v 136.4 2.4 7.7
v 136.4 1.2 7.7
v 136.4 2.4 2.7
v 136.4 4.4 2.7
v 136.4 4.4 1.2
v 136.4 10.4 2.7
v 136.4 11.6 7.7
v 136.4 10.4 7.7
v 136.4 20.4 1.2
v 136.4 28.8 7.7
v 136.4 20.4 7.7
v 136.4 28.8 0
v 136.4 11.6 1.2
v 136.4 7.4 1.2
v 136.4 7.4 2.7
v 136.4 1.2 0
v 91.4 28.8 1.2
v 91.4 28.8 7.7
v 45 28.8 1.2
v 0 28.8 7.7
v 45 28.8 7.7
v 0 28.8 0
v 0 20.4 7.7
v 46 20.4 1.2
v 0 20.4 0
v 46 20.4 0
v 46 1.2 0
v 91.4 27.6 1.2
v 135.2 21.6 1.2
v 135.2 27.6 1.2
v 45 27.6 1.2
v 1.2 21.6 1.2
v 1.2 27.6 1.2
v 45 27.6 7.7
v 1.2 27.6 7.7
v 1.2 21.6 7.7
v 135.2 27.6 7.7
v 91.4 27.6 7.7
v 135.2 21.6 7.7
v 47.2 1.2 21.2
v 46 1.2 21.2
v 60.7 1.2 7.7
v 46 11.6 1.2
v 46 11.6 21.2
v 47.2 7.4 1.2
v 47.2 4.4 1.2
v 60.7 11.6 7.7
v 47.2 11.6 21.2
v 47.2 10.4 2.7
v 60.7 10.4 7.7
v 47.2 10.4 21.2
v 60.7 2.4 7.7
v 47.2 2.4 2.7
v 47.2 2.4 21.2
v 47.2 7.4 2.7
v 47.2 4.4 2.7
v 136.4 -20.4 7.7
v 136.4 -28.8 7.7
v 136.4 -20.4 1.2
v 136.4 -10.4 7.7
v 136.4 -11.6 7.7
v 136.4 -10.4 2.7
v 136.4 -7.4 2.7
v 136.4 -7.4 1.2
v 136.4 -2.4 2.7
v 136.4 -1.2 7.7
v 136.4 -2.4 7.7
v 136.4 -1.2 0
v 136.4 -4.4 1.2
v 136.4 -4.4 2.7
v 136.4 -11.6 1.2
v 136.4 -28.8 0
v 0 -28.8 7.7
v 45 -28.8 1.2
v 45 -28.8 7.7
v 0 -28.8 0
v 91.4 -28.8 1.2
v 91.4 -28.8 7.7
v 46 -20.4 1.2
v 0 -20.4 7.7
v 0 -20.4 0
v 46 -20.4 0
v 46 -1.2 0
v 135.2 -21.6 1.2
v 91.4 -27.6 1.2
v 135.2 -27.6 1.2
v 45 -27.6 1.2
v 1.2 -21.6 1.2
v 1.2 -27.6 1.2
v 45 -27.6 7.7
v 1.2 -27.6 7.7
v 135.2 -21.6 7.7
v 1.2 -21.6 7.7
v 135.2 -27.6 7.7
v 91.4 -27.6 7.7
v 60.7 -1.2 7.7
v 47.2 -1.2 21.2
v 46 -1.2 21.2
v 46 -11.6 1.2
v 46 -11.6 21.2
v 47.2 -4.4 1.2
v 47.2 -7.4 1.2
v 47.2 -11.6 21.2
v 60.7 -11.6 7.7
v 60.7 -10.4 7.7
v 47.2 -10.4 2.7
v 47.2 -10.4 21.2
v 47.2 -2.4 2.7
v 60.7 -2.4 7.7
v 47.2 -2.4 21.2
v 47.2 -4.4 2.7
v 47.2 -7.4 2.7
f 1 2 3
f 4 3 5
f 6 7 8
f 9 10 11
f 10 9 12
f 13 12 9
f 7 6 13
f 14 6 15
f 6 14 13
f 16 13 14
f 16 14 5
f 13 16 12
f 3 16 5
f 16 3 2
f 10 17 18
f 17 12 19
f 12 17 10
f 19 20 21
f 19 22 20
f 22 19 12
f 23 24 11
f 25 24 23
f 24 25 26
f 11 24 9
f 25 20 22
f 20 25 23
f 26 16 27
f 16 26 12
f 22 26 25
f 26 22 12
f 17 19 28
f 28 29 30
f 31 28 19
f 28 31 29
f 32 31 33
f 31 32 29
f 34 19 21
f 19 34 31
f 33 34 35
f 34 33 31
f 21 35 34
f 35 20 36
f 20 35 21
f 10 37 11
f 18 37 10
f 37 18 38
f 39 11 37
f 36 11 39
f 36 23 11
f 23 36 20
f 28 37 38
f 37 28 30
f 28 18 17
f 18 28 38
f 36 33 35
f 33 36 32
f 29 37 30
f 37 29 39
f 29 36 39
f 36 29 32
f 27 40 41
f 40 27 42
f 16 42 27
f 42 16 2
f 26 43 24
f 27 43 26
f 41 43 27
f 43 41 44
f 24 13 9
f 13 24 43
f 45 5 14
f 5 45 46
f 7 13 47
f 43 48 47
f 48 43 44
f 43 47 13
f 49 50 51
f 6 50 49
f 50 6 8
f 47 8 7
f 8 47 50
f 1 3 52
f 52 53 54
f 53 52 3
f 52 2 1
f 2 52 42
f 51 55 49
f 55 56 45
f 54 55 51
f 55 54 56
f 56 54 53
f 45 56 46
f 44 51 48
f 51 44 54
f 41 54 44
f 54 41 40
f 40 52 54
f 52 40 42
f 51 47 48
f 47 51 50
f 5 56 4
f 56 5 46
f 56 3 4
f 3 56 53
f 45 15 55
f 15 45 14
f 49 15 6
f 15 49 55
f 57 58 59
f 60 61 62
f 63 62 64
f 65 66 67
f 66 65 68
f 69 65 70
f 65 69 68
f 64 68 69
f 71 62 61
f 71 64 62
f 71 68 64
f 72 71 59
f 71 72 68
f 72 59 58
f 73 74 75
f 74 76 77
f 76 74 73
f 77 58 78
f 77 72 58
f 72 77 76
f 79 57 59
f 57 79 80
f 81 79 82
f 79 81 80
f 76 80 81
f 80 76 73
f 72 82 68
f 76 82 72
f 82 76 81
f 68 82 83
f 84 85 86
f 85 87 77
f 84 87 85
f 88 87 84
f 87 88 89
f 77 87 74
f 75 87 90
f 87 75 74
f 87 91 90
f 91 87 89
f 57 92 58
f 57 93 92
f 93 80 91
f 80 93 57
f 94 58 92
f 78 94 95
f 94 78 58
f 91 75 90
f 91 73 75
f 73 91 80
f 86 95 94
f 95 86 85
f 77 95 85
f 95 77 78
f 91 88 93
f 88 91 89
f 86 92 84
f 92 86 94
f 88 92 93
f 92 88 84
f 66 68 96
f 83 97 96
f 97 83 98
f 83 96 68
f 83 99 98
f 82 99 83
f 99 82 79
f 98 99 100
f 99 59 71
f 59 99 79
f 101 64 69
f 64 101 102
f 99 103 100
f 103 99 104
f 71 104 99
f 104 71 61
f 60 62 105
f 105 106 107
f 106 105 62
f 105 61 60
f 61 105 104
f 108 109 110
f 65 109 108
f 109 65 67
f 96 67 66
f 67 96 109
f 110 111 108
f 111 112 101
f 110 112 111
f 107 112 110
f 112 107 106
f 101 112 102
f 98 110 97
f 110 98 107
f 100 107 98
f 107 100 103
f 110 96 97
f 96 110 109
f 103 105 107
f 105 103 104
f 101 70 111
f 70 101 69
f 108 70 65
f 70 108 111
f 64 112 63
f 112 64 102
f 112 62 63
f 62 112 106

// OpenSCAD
// Mount for holding phone reliably under the D7 build plate, for taking
// pictures of the UV display in an attempt to create a mask.
// See https://www.facebook.com/groups/287910088208745/permalink/528854347447650/

/* Phone dimensions */
// Length of phone in mm
phone_x=147.0; // [50.0:1.0:200.0]
// Width of phone in mm
phone_y=72.0; // [30.0:1.0:75.0]
// Phone thickness in mm
phone_z=8.0; // [1.0:0.2:20.0]
// Height above phone back, clear of switches
phone_lower_hold_z=2.0; // [00:0.1:10.0]
// Height below phone face, clear of switches
phone_upper_hold_z=3.0; // [0.0:0.1:10.0]

// camera center position, distance from end of phone
camera_x=21.0; // [0.0:1.0:150.0]

// gap above phone below plate
extension_z=10.0; // [0.0:1.0:20.0]

// Width of the shell holding underneath the phone
phone_hold=5; // [0.0:1.0:10.0]
// Width of the holding block on each side - measured from the outside of the bracket. Needs to be enough to reach past any curve in the phone corners
hold_depth=20; // [0.0:1.0:40.0]
// Thickness of the shell
thickness=1.2; // [0.1:0.1:3.0]

module break() {};

// Plate dimensions
plate_x=134.0;
plate_y=75.0;
plate_z=6.0;
carriage_x=44.0; // central...

depth=(plate_y-phone_y)/2+phone_hold;

module corner(s, h) {
  linear_extrude(height=h)
  polygon([[0,0],[s,0],[0,s]]);
}

// Assumes phone is smaller than the bracket
module bracket() {
  // back panel - plate
  translate([0,0,extension_z+phone_z+thickness])
  cube([plate_x+thickness*2,thickness,plate_z+thickness*2]);
  // top left plate cover
  translate([0,-depth,extension_z+plate_z+phone_z+thickness*2])
  cube([(plate_x-carriage_x)/2,depth+thickness,thickness]);
  // top right plate cover
  translate([plate_x+thickness*2-(plate_x-carriage_x)/2,-depth,extension_z+plate_z+phone_z+thickness*2])
  cube([(plate_x-carriage_x)/2,depth+thickness,thickness]);
  // left plate edge
  translate([0,-depth,extension_z+phone_z+thickness])
  cube([thickness,depth+thickness,plate_z+thickness*2]);
  // right plate edge
  translate([plate_x+thickness*2-thickness,-depth,extension_z+phone_z+thickness])
  cube([thickness,depth+thickness,plate_z+thickness*2]);
  // under plate
  translate([0,-depth,extension_z+phone_z+thickness])
  cube([plate_x+thickness*2,depth+thickness,thickness]);
  
  // back panel - phone and extension
  translate([plate_x/2+thickness-camera_x-thickness,0,0])
  cube([plate_x/2+thickness+camera_x+thickness,thickness,extension_z+phone_z+thickness*2]);
  
  // over phone
  translate([plate_x/2+thickness-camera_x-thickness,-depth,phone_z+thickness])
  cube([plate_x/2+thickness+camera_x+thickness,depth+thickness,thickness]);
  // under phone
  translate([plate_x/2+thickness-camera_x-thickness,-depth,0])
  cube([plate_x/2+thickness+camera_x+thickness,depth+thickness,thickness]);
  // phone end stop
  translate([plate_x/2+thickness-camera_x-thickness,-hold_depth,0])
  cube([thickness,hold_depth+thickness,phone_z+thickness*2]);
  translate([plate_x/2+thickness-camera_x,0,0])
  rotate(a=-90,v=[0,0,1]) corner(s=hold_depth,h=thickness);
  translate([plate_x/2+thickness-camera_x,0,phone_z+thickness])
  rotate(a=-90,v=[0,0,1]) corner(s=hold_depth,h=thickness);
  // phone edge fill - two bands, upper and lower leaving a channel to prevent
  // side buttons being pressed.
  translate([plate_x/2+thickness-camera_x-thickness,-(plate_y-phone_y)/2,0])
  cube([plate_x/2+thickness+camera_x+thickness,(plate_y-phone_y)/2+thickness,phone_lower_hold_z+thickness]);
  translate([plate_x/2+thickness-camera_x-thickness,-(plate_y-phone_y)/2,phone_z-phone_upper_hold_z+thickness])
  cube([plate_x/2+thickness+camera_x+thickness,(plate_y-phone_y)/2+thickness,phone_upper_hold_z+thickness]);
}

//bracket();

translate([0,thickness,0])
rotate(a=-90,v=[1,0,0]) translate([0,-thickness,0]) bracket();
translate([0,-thickness,0])
mirror([0,1,0])
rotate(a=-90,v=[1,0,0]) translate([0,-thickness,0]) bracket();
